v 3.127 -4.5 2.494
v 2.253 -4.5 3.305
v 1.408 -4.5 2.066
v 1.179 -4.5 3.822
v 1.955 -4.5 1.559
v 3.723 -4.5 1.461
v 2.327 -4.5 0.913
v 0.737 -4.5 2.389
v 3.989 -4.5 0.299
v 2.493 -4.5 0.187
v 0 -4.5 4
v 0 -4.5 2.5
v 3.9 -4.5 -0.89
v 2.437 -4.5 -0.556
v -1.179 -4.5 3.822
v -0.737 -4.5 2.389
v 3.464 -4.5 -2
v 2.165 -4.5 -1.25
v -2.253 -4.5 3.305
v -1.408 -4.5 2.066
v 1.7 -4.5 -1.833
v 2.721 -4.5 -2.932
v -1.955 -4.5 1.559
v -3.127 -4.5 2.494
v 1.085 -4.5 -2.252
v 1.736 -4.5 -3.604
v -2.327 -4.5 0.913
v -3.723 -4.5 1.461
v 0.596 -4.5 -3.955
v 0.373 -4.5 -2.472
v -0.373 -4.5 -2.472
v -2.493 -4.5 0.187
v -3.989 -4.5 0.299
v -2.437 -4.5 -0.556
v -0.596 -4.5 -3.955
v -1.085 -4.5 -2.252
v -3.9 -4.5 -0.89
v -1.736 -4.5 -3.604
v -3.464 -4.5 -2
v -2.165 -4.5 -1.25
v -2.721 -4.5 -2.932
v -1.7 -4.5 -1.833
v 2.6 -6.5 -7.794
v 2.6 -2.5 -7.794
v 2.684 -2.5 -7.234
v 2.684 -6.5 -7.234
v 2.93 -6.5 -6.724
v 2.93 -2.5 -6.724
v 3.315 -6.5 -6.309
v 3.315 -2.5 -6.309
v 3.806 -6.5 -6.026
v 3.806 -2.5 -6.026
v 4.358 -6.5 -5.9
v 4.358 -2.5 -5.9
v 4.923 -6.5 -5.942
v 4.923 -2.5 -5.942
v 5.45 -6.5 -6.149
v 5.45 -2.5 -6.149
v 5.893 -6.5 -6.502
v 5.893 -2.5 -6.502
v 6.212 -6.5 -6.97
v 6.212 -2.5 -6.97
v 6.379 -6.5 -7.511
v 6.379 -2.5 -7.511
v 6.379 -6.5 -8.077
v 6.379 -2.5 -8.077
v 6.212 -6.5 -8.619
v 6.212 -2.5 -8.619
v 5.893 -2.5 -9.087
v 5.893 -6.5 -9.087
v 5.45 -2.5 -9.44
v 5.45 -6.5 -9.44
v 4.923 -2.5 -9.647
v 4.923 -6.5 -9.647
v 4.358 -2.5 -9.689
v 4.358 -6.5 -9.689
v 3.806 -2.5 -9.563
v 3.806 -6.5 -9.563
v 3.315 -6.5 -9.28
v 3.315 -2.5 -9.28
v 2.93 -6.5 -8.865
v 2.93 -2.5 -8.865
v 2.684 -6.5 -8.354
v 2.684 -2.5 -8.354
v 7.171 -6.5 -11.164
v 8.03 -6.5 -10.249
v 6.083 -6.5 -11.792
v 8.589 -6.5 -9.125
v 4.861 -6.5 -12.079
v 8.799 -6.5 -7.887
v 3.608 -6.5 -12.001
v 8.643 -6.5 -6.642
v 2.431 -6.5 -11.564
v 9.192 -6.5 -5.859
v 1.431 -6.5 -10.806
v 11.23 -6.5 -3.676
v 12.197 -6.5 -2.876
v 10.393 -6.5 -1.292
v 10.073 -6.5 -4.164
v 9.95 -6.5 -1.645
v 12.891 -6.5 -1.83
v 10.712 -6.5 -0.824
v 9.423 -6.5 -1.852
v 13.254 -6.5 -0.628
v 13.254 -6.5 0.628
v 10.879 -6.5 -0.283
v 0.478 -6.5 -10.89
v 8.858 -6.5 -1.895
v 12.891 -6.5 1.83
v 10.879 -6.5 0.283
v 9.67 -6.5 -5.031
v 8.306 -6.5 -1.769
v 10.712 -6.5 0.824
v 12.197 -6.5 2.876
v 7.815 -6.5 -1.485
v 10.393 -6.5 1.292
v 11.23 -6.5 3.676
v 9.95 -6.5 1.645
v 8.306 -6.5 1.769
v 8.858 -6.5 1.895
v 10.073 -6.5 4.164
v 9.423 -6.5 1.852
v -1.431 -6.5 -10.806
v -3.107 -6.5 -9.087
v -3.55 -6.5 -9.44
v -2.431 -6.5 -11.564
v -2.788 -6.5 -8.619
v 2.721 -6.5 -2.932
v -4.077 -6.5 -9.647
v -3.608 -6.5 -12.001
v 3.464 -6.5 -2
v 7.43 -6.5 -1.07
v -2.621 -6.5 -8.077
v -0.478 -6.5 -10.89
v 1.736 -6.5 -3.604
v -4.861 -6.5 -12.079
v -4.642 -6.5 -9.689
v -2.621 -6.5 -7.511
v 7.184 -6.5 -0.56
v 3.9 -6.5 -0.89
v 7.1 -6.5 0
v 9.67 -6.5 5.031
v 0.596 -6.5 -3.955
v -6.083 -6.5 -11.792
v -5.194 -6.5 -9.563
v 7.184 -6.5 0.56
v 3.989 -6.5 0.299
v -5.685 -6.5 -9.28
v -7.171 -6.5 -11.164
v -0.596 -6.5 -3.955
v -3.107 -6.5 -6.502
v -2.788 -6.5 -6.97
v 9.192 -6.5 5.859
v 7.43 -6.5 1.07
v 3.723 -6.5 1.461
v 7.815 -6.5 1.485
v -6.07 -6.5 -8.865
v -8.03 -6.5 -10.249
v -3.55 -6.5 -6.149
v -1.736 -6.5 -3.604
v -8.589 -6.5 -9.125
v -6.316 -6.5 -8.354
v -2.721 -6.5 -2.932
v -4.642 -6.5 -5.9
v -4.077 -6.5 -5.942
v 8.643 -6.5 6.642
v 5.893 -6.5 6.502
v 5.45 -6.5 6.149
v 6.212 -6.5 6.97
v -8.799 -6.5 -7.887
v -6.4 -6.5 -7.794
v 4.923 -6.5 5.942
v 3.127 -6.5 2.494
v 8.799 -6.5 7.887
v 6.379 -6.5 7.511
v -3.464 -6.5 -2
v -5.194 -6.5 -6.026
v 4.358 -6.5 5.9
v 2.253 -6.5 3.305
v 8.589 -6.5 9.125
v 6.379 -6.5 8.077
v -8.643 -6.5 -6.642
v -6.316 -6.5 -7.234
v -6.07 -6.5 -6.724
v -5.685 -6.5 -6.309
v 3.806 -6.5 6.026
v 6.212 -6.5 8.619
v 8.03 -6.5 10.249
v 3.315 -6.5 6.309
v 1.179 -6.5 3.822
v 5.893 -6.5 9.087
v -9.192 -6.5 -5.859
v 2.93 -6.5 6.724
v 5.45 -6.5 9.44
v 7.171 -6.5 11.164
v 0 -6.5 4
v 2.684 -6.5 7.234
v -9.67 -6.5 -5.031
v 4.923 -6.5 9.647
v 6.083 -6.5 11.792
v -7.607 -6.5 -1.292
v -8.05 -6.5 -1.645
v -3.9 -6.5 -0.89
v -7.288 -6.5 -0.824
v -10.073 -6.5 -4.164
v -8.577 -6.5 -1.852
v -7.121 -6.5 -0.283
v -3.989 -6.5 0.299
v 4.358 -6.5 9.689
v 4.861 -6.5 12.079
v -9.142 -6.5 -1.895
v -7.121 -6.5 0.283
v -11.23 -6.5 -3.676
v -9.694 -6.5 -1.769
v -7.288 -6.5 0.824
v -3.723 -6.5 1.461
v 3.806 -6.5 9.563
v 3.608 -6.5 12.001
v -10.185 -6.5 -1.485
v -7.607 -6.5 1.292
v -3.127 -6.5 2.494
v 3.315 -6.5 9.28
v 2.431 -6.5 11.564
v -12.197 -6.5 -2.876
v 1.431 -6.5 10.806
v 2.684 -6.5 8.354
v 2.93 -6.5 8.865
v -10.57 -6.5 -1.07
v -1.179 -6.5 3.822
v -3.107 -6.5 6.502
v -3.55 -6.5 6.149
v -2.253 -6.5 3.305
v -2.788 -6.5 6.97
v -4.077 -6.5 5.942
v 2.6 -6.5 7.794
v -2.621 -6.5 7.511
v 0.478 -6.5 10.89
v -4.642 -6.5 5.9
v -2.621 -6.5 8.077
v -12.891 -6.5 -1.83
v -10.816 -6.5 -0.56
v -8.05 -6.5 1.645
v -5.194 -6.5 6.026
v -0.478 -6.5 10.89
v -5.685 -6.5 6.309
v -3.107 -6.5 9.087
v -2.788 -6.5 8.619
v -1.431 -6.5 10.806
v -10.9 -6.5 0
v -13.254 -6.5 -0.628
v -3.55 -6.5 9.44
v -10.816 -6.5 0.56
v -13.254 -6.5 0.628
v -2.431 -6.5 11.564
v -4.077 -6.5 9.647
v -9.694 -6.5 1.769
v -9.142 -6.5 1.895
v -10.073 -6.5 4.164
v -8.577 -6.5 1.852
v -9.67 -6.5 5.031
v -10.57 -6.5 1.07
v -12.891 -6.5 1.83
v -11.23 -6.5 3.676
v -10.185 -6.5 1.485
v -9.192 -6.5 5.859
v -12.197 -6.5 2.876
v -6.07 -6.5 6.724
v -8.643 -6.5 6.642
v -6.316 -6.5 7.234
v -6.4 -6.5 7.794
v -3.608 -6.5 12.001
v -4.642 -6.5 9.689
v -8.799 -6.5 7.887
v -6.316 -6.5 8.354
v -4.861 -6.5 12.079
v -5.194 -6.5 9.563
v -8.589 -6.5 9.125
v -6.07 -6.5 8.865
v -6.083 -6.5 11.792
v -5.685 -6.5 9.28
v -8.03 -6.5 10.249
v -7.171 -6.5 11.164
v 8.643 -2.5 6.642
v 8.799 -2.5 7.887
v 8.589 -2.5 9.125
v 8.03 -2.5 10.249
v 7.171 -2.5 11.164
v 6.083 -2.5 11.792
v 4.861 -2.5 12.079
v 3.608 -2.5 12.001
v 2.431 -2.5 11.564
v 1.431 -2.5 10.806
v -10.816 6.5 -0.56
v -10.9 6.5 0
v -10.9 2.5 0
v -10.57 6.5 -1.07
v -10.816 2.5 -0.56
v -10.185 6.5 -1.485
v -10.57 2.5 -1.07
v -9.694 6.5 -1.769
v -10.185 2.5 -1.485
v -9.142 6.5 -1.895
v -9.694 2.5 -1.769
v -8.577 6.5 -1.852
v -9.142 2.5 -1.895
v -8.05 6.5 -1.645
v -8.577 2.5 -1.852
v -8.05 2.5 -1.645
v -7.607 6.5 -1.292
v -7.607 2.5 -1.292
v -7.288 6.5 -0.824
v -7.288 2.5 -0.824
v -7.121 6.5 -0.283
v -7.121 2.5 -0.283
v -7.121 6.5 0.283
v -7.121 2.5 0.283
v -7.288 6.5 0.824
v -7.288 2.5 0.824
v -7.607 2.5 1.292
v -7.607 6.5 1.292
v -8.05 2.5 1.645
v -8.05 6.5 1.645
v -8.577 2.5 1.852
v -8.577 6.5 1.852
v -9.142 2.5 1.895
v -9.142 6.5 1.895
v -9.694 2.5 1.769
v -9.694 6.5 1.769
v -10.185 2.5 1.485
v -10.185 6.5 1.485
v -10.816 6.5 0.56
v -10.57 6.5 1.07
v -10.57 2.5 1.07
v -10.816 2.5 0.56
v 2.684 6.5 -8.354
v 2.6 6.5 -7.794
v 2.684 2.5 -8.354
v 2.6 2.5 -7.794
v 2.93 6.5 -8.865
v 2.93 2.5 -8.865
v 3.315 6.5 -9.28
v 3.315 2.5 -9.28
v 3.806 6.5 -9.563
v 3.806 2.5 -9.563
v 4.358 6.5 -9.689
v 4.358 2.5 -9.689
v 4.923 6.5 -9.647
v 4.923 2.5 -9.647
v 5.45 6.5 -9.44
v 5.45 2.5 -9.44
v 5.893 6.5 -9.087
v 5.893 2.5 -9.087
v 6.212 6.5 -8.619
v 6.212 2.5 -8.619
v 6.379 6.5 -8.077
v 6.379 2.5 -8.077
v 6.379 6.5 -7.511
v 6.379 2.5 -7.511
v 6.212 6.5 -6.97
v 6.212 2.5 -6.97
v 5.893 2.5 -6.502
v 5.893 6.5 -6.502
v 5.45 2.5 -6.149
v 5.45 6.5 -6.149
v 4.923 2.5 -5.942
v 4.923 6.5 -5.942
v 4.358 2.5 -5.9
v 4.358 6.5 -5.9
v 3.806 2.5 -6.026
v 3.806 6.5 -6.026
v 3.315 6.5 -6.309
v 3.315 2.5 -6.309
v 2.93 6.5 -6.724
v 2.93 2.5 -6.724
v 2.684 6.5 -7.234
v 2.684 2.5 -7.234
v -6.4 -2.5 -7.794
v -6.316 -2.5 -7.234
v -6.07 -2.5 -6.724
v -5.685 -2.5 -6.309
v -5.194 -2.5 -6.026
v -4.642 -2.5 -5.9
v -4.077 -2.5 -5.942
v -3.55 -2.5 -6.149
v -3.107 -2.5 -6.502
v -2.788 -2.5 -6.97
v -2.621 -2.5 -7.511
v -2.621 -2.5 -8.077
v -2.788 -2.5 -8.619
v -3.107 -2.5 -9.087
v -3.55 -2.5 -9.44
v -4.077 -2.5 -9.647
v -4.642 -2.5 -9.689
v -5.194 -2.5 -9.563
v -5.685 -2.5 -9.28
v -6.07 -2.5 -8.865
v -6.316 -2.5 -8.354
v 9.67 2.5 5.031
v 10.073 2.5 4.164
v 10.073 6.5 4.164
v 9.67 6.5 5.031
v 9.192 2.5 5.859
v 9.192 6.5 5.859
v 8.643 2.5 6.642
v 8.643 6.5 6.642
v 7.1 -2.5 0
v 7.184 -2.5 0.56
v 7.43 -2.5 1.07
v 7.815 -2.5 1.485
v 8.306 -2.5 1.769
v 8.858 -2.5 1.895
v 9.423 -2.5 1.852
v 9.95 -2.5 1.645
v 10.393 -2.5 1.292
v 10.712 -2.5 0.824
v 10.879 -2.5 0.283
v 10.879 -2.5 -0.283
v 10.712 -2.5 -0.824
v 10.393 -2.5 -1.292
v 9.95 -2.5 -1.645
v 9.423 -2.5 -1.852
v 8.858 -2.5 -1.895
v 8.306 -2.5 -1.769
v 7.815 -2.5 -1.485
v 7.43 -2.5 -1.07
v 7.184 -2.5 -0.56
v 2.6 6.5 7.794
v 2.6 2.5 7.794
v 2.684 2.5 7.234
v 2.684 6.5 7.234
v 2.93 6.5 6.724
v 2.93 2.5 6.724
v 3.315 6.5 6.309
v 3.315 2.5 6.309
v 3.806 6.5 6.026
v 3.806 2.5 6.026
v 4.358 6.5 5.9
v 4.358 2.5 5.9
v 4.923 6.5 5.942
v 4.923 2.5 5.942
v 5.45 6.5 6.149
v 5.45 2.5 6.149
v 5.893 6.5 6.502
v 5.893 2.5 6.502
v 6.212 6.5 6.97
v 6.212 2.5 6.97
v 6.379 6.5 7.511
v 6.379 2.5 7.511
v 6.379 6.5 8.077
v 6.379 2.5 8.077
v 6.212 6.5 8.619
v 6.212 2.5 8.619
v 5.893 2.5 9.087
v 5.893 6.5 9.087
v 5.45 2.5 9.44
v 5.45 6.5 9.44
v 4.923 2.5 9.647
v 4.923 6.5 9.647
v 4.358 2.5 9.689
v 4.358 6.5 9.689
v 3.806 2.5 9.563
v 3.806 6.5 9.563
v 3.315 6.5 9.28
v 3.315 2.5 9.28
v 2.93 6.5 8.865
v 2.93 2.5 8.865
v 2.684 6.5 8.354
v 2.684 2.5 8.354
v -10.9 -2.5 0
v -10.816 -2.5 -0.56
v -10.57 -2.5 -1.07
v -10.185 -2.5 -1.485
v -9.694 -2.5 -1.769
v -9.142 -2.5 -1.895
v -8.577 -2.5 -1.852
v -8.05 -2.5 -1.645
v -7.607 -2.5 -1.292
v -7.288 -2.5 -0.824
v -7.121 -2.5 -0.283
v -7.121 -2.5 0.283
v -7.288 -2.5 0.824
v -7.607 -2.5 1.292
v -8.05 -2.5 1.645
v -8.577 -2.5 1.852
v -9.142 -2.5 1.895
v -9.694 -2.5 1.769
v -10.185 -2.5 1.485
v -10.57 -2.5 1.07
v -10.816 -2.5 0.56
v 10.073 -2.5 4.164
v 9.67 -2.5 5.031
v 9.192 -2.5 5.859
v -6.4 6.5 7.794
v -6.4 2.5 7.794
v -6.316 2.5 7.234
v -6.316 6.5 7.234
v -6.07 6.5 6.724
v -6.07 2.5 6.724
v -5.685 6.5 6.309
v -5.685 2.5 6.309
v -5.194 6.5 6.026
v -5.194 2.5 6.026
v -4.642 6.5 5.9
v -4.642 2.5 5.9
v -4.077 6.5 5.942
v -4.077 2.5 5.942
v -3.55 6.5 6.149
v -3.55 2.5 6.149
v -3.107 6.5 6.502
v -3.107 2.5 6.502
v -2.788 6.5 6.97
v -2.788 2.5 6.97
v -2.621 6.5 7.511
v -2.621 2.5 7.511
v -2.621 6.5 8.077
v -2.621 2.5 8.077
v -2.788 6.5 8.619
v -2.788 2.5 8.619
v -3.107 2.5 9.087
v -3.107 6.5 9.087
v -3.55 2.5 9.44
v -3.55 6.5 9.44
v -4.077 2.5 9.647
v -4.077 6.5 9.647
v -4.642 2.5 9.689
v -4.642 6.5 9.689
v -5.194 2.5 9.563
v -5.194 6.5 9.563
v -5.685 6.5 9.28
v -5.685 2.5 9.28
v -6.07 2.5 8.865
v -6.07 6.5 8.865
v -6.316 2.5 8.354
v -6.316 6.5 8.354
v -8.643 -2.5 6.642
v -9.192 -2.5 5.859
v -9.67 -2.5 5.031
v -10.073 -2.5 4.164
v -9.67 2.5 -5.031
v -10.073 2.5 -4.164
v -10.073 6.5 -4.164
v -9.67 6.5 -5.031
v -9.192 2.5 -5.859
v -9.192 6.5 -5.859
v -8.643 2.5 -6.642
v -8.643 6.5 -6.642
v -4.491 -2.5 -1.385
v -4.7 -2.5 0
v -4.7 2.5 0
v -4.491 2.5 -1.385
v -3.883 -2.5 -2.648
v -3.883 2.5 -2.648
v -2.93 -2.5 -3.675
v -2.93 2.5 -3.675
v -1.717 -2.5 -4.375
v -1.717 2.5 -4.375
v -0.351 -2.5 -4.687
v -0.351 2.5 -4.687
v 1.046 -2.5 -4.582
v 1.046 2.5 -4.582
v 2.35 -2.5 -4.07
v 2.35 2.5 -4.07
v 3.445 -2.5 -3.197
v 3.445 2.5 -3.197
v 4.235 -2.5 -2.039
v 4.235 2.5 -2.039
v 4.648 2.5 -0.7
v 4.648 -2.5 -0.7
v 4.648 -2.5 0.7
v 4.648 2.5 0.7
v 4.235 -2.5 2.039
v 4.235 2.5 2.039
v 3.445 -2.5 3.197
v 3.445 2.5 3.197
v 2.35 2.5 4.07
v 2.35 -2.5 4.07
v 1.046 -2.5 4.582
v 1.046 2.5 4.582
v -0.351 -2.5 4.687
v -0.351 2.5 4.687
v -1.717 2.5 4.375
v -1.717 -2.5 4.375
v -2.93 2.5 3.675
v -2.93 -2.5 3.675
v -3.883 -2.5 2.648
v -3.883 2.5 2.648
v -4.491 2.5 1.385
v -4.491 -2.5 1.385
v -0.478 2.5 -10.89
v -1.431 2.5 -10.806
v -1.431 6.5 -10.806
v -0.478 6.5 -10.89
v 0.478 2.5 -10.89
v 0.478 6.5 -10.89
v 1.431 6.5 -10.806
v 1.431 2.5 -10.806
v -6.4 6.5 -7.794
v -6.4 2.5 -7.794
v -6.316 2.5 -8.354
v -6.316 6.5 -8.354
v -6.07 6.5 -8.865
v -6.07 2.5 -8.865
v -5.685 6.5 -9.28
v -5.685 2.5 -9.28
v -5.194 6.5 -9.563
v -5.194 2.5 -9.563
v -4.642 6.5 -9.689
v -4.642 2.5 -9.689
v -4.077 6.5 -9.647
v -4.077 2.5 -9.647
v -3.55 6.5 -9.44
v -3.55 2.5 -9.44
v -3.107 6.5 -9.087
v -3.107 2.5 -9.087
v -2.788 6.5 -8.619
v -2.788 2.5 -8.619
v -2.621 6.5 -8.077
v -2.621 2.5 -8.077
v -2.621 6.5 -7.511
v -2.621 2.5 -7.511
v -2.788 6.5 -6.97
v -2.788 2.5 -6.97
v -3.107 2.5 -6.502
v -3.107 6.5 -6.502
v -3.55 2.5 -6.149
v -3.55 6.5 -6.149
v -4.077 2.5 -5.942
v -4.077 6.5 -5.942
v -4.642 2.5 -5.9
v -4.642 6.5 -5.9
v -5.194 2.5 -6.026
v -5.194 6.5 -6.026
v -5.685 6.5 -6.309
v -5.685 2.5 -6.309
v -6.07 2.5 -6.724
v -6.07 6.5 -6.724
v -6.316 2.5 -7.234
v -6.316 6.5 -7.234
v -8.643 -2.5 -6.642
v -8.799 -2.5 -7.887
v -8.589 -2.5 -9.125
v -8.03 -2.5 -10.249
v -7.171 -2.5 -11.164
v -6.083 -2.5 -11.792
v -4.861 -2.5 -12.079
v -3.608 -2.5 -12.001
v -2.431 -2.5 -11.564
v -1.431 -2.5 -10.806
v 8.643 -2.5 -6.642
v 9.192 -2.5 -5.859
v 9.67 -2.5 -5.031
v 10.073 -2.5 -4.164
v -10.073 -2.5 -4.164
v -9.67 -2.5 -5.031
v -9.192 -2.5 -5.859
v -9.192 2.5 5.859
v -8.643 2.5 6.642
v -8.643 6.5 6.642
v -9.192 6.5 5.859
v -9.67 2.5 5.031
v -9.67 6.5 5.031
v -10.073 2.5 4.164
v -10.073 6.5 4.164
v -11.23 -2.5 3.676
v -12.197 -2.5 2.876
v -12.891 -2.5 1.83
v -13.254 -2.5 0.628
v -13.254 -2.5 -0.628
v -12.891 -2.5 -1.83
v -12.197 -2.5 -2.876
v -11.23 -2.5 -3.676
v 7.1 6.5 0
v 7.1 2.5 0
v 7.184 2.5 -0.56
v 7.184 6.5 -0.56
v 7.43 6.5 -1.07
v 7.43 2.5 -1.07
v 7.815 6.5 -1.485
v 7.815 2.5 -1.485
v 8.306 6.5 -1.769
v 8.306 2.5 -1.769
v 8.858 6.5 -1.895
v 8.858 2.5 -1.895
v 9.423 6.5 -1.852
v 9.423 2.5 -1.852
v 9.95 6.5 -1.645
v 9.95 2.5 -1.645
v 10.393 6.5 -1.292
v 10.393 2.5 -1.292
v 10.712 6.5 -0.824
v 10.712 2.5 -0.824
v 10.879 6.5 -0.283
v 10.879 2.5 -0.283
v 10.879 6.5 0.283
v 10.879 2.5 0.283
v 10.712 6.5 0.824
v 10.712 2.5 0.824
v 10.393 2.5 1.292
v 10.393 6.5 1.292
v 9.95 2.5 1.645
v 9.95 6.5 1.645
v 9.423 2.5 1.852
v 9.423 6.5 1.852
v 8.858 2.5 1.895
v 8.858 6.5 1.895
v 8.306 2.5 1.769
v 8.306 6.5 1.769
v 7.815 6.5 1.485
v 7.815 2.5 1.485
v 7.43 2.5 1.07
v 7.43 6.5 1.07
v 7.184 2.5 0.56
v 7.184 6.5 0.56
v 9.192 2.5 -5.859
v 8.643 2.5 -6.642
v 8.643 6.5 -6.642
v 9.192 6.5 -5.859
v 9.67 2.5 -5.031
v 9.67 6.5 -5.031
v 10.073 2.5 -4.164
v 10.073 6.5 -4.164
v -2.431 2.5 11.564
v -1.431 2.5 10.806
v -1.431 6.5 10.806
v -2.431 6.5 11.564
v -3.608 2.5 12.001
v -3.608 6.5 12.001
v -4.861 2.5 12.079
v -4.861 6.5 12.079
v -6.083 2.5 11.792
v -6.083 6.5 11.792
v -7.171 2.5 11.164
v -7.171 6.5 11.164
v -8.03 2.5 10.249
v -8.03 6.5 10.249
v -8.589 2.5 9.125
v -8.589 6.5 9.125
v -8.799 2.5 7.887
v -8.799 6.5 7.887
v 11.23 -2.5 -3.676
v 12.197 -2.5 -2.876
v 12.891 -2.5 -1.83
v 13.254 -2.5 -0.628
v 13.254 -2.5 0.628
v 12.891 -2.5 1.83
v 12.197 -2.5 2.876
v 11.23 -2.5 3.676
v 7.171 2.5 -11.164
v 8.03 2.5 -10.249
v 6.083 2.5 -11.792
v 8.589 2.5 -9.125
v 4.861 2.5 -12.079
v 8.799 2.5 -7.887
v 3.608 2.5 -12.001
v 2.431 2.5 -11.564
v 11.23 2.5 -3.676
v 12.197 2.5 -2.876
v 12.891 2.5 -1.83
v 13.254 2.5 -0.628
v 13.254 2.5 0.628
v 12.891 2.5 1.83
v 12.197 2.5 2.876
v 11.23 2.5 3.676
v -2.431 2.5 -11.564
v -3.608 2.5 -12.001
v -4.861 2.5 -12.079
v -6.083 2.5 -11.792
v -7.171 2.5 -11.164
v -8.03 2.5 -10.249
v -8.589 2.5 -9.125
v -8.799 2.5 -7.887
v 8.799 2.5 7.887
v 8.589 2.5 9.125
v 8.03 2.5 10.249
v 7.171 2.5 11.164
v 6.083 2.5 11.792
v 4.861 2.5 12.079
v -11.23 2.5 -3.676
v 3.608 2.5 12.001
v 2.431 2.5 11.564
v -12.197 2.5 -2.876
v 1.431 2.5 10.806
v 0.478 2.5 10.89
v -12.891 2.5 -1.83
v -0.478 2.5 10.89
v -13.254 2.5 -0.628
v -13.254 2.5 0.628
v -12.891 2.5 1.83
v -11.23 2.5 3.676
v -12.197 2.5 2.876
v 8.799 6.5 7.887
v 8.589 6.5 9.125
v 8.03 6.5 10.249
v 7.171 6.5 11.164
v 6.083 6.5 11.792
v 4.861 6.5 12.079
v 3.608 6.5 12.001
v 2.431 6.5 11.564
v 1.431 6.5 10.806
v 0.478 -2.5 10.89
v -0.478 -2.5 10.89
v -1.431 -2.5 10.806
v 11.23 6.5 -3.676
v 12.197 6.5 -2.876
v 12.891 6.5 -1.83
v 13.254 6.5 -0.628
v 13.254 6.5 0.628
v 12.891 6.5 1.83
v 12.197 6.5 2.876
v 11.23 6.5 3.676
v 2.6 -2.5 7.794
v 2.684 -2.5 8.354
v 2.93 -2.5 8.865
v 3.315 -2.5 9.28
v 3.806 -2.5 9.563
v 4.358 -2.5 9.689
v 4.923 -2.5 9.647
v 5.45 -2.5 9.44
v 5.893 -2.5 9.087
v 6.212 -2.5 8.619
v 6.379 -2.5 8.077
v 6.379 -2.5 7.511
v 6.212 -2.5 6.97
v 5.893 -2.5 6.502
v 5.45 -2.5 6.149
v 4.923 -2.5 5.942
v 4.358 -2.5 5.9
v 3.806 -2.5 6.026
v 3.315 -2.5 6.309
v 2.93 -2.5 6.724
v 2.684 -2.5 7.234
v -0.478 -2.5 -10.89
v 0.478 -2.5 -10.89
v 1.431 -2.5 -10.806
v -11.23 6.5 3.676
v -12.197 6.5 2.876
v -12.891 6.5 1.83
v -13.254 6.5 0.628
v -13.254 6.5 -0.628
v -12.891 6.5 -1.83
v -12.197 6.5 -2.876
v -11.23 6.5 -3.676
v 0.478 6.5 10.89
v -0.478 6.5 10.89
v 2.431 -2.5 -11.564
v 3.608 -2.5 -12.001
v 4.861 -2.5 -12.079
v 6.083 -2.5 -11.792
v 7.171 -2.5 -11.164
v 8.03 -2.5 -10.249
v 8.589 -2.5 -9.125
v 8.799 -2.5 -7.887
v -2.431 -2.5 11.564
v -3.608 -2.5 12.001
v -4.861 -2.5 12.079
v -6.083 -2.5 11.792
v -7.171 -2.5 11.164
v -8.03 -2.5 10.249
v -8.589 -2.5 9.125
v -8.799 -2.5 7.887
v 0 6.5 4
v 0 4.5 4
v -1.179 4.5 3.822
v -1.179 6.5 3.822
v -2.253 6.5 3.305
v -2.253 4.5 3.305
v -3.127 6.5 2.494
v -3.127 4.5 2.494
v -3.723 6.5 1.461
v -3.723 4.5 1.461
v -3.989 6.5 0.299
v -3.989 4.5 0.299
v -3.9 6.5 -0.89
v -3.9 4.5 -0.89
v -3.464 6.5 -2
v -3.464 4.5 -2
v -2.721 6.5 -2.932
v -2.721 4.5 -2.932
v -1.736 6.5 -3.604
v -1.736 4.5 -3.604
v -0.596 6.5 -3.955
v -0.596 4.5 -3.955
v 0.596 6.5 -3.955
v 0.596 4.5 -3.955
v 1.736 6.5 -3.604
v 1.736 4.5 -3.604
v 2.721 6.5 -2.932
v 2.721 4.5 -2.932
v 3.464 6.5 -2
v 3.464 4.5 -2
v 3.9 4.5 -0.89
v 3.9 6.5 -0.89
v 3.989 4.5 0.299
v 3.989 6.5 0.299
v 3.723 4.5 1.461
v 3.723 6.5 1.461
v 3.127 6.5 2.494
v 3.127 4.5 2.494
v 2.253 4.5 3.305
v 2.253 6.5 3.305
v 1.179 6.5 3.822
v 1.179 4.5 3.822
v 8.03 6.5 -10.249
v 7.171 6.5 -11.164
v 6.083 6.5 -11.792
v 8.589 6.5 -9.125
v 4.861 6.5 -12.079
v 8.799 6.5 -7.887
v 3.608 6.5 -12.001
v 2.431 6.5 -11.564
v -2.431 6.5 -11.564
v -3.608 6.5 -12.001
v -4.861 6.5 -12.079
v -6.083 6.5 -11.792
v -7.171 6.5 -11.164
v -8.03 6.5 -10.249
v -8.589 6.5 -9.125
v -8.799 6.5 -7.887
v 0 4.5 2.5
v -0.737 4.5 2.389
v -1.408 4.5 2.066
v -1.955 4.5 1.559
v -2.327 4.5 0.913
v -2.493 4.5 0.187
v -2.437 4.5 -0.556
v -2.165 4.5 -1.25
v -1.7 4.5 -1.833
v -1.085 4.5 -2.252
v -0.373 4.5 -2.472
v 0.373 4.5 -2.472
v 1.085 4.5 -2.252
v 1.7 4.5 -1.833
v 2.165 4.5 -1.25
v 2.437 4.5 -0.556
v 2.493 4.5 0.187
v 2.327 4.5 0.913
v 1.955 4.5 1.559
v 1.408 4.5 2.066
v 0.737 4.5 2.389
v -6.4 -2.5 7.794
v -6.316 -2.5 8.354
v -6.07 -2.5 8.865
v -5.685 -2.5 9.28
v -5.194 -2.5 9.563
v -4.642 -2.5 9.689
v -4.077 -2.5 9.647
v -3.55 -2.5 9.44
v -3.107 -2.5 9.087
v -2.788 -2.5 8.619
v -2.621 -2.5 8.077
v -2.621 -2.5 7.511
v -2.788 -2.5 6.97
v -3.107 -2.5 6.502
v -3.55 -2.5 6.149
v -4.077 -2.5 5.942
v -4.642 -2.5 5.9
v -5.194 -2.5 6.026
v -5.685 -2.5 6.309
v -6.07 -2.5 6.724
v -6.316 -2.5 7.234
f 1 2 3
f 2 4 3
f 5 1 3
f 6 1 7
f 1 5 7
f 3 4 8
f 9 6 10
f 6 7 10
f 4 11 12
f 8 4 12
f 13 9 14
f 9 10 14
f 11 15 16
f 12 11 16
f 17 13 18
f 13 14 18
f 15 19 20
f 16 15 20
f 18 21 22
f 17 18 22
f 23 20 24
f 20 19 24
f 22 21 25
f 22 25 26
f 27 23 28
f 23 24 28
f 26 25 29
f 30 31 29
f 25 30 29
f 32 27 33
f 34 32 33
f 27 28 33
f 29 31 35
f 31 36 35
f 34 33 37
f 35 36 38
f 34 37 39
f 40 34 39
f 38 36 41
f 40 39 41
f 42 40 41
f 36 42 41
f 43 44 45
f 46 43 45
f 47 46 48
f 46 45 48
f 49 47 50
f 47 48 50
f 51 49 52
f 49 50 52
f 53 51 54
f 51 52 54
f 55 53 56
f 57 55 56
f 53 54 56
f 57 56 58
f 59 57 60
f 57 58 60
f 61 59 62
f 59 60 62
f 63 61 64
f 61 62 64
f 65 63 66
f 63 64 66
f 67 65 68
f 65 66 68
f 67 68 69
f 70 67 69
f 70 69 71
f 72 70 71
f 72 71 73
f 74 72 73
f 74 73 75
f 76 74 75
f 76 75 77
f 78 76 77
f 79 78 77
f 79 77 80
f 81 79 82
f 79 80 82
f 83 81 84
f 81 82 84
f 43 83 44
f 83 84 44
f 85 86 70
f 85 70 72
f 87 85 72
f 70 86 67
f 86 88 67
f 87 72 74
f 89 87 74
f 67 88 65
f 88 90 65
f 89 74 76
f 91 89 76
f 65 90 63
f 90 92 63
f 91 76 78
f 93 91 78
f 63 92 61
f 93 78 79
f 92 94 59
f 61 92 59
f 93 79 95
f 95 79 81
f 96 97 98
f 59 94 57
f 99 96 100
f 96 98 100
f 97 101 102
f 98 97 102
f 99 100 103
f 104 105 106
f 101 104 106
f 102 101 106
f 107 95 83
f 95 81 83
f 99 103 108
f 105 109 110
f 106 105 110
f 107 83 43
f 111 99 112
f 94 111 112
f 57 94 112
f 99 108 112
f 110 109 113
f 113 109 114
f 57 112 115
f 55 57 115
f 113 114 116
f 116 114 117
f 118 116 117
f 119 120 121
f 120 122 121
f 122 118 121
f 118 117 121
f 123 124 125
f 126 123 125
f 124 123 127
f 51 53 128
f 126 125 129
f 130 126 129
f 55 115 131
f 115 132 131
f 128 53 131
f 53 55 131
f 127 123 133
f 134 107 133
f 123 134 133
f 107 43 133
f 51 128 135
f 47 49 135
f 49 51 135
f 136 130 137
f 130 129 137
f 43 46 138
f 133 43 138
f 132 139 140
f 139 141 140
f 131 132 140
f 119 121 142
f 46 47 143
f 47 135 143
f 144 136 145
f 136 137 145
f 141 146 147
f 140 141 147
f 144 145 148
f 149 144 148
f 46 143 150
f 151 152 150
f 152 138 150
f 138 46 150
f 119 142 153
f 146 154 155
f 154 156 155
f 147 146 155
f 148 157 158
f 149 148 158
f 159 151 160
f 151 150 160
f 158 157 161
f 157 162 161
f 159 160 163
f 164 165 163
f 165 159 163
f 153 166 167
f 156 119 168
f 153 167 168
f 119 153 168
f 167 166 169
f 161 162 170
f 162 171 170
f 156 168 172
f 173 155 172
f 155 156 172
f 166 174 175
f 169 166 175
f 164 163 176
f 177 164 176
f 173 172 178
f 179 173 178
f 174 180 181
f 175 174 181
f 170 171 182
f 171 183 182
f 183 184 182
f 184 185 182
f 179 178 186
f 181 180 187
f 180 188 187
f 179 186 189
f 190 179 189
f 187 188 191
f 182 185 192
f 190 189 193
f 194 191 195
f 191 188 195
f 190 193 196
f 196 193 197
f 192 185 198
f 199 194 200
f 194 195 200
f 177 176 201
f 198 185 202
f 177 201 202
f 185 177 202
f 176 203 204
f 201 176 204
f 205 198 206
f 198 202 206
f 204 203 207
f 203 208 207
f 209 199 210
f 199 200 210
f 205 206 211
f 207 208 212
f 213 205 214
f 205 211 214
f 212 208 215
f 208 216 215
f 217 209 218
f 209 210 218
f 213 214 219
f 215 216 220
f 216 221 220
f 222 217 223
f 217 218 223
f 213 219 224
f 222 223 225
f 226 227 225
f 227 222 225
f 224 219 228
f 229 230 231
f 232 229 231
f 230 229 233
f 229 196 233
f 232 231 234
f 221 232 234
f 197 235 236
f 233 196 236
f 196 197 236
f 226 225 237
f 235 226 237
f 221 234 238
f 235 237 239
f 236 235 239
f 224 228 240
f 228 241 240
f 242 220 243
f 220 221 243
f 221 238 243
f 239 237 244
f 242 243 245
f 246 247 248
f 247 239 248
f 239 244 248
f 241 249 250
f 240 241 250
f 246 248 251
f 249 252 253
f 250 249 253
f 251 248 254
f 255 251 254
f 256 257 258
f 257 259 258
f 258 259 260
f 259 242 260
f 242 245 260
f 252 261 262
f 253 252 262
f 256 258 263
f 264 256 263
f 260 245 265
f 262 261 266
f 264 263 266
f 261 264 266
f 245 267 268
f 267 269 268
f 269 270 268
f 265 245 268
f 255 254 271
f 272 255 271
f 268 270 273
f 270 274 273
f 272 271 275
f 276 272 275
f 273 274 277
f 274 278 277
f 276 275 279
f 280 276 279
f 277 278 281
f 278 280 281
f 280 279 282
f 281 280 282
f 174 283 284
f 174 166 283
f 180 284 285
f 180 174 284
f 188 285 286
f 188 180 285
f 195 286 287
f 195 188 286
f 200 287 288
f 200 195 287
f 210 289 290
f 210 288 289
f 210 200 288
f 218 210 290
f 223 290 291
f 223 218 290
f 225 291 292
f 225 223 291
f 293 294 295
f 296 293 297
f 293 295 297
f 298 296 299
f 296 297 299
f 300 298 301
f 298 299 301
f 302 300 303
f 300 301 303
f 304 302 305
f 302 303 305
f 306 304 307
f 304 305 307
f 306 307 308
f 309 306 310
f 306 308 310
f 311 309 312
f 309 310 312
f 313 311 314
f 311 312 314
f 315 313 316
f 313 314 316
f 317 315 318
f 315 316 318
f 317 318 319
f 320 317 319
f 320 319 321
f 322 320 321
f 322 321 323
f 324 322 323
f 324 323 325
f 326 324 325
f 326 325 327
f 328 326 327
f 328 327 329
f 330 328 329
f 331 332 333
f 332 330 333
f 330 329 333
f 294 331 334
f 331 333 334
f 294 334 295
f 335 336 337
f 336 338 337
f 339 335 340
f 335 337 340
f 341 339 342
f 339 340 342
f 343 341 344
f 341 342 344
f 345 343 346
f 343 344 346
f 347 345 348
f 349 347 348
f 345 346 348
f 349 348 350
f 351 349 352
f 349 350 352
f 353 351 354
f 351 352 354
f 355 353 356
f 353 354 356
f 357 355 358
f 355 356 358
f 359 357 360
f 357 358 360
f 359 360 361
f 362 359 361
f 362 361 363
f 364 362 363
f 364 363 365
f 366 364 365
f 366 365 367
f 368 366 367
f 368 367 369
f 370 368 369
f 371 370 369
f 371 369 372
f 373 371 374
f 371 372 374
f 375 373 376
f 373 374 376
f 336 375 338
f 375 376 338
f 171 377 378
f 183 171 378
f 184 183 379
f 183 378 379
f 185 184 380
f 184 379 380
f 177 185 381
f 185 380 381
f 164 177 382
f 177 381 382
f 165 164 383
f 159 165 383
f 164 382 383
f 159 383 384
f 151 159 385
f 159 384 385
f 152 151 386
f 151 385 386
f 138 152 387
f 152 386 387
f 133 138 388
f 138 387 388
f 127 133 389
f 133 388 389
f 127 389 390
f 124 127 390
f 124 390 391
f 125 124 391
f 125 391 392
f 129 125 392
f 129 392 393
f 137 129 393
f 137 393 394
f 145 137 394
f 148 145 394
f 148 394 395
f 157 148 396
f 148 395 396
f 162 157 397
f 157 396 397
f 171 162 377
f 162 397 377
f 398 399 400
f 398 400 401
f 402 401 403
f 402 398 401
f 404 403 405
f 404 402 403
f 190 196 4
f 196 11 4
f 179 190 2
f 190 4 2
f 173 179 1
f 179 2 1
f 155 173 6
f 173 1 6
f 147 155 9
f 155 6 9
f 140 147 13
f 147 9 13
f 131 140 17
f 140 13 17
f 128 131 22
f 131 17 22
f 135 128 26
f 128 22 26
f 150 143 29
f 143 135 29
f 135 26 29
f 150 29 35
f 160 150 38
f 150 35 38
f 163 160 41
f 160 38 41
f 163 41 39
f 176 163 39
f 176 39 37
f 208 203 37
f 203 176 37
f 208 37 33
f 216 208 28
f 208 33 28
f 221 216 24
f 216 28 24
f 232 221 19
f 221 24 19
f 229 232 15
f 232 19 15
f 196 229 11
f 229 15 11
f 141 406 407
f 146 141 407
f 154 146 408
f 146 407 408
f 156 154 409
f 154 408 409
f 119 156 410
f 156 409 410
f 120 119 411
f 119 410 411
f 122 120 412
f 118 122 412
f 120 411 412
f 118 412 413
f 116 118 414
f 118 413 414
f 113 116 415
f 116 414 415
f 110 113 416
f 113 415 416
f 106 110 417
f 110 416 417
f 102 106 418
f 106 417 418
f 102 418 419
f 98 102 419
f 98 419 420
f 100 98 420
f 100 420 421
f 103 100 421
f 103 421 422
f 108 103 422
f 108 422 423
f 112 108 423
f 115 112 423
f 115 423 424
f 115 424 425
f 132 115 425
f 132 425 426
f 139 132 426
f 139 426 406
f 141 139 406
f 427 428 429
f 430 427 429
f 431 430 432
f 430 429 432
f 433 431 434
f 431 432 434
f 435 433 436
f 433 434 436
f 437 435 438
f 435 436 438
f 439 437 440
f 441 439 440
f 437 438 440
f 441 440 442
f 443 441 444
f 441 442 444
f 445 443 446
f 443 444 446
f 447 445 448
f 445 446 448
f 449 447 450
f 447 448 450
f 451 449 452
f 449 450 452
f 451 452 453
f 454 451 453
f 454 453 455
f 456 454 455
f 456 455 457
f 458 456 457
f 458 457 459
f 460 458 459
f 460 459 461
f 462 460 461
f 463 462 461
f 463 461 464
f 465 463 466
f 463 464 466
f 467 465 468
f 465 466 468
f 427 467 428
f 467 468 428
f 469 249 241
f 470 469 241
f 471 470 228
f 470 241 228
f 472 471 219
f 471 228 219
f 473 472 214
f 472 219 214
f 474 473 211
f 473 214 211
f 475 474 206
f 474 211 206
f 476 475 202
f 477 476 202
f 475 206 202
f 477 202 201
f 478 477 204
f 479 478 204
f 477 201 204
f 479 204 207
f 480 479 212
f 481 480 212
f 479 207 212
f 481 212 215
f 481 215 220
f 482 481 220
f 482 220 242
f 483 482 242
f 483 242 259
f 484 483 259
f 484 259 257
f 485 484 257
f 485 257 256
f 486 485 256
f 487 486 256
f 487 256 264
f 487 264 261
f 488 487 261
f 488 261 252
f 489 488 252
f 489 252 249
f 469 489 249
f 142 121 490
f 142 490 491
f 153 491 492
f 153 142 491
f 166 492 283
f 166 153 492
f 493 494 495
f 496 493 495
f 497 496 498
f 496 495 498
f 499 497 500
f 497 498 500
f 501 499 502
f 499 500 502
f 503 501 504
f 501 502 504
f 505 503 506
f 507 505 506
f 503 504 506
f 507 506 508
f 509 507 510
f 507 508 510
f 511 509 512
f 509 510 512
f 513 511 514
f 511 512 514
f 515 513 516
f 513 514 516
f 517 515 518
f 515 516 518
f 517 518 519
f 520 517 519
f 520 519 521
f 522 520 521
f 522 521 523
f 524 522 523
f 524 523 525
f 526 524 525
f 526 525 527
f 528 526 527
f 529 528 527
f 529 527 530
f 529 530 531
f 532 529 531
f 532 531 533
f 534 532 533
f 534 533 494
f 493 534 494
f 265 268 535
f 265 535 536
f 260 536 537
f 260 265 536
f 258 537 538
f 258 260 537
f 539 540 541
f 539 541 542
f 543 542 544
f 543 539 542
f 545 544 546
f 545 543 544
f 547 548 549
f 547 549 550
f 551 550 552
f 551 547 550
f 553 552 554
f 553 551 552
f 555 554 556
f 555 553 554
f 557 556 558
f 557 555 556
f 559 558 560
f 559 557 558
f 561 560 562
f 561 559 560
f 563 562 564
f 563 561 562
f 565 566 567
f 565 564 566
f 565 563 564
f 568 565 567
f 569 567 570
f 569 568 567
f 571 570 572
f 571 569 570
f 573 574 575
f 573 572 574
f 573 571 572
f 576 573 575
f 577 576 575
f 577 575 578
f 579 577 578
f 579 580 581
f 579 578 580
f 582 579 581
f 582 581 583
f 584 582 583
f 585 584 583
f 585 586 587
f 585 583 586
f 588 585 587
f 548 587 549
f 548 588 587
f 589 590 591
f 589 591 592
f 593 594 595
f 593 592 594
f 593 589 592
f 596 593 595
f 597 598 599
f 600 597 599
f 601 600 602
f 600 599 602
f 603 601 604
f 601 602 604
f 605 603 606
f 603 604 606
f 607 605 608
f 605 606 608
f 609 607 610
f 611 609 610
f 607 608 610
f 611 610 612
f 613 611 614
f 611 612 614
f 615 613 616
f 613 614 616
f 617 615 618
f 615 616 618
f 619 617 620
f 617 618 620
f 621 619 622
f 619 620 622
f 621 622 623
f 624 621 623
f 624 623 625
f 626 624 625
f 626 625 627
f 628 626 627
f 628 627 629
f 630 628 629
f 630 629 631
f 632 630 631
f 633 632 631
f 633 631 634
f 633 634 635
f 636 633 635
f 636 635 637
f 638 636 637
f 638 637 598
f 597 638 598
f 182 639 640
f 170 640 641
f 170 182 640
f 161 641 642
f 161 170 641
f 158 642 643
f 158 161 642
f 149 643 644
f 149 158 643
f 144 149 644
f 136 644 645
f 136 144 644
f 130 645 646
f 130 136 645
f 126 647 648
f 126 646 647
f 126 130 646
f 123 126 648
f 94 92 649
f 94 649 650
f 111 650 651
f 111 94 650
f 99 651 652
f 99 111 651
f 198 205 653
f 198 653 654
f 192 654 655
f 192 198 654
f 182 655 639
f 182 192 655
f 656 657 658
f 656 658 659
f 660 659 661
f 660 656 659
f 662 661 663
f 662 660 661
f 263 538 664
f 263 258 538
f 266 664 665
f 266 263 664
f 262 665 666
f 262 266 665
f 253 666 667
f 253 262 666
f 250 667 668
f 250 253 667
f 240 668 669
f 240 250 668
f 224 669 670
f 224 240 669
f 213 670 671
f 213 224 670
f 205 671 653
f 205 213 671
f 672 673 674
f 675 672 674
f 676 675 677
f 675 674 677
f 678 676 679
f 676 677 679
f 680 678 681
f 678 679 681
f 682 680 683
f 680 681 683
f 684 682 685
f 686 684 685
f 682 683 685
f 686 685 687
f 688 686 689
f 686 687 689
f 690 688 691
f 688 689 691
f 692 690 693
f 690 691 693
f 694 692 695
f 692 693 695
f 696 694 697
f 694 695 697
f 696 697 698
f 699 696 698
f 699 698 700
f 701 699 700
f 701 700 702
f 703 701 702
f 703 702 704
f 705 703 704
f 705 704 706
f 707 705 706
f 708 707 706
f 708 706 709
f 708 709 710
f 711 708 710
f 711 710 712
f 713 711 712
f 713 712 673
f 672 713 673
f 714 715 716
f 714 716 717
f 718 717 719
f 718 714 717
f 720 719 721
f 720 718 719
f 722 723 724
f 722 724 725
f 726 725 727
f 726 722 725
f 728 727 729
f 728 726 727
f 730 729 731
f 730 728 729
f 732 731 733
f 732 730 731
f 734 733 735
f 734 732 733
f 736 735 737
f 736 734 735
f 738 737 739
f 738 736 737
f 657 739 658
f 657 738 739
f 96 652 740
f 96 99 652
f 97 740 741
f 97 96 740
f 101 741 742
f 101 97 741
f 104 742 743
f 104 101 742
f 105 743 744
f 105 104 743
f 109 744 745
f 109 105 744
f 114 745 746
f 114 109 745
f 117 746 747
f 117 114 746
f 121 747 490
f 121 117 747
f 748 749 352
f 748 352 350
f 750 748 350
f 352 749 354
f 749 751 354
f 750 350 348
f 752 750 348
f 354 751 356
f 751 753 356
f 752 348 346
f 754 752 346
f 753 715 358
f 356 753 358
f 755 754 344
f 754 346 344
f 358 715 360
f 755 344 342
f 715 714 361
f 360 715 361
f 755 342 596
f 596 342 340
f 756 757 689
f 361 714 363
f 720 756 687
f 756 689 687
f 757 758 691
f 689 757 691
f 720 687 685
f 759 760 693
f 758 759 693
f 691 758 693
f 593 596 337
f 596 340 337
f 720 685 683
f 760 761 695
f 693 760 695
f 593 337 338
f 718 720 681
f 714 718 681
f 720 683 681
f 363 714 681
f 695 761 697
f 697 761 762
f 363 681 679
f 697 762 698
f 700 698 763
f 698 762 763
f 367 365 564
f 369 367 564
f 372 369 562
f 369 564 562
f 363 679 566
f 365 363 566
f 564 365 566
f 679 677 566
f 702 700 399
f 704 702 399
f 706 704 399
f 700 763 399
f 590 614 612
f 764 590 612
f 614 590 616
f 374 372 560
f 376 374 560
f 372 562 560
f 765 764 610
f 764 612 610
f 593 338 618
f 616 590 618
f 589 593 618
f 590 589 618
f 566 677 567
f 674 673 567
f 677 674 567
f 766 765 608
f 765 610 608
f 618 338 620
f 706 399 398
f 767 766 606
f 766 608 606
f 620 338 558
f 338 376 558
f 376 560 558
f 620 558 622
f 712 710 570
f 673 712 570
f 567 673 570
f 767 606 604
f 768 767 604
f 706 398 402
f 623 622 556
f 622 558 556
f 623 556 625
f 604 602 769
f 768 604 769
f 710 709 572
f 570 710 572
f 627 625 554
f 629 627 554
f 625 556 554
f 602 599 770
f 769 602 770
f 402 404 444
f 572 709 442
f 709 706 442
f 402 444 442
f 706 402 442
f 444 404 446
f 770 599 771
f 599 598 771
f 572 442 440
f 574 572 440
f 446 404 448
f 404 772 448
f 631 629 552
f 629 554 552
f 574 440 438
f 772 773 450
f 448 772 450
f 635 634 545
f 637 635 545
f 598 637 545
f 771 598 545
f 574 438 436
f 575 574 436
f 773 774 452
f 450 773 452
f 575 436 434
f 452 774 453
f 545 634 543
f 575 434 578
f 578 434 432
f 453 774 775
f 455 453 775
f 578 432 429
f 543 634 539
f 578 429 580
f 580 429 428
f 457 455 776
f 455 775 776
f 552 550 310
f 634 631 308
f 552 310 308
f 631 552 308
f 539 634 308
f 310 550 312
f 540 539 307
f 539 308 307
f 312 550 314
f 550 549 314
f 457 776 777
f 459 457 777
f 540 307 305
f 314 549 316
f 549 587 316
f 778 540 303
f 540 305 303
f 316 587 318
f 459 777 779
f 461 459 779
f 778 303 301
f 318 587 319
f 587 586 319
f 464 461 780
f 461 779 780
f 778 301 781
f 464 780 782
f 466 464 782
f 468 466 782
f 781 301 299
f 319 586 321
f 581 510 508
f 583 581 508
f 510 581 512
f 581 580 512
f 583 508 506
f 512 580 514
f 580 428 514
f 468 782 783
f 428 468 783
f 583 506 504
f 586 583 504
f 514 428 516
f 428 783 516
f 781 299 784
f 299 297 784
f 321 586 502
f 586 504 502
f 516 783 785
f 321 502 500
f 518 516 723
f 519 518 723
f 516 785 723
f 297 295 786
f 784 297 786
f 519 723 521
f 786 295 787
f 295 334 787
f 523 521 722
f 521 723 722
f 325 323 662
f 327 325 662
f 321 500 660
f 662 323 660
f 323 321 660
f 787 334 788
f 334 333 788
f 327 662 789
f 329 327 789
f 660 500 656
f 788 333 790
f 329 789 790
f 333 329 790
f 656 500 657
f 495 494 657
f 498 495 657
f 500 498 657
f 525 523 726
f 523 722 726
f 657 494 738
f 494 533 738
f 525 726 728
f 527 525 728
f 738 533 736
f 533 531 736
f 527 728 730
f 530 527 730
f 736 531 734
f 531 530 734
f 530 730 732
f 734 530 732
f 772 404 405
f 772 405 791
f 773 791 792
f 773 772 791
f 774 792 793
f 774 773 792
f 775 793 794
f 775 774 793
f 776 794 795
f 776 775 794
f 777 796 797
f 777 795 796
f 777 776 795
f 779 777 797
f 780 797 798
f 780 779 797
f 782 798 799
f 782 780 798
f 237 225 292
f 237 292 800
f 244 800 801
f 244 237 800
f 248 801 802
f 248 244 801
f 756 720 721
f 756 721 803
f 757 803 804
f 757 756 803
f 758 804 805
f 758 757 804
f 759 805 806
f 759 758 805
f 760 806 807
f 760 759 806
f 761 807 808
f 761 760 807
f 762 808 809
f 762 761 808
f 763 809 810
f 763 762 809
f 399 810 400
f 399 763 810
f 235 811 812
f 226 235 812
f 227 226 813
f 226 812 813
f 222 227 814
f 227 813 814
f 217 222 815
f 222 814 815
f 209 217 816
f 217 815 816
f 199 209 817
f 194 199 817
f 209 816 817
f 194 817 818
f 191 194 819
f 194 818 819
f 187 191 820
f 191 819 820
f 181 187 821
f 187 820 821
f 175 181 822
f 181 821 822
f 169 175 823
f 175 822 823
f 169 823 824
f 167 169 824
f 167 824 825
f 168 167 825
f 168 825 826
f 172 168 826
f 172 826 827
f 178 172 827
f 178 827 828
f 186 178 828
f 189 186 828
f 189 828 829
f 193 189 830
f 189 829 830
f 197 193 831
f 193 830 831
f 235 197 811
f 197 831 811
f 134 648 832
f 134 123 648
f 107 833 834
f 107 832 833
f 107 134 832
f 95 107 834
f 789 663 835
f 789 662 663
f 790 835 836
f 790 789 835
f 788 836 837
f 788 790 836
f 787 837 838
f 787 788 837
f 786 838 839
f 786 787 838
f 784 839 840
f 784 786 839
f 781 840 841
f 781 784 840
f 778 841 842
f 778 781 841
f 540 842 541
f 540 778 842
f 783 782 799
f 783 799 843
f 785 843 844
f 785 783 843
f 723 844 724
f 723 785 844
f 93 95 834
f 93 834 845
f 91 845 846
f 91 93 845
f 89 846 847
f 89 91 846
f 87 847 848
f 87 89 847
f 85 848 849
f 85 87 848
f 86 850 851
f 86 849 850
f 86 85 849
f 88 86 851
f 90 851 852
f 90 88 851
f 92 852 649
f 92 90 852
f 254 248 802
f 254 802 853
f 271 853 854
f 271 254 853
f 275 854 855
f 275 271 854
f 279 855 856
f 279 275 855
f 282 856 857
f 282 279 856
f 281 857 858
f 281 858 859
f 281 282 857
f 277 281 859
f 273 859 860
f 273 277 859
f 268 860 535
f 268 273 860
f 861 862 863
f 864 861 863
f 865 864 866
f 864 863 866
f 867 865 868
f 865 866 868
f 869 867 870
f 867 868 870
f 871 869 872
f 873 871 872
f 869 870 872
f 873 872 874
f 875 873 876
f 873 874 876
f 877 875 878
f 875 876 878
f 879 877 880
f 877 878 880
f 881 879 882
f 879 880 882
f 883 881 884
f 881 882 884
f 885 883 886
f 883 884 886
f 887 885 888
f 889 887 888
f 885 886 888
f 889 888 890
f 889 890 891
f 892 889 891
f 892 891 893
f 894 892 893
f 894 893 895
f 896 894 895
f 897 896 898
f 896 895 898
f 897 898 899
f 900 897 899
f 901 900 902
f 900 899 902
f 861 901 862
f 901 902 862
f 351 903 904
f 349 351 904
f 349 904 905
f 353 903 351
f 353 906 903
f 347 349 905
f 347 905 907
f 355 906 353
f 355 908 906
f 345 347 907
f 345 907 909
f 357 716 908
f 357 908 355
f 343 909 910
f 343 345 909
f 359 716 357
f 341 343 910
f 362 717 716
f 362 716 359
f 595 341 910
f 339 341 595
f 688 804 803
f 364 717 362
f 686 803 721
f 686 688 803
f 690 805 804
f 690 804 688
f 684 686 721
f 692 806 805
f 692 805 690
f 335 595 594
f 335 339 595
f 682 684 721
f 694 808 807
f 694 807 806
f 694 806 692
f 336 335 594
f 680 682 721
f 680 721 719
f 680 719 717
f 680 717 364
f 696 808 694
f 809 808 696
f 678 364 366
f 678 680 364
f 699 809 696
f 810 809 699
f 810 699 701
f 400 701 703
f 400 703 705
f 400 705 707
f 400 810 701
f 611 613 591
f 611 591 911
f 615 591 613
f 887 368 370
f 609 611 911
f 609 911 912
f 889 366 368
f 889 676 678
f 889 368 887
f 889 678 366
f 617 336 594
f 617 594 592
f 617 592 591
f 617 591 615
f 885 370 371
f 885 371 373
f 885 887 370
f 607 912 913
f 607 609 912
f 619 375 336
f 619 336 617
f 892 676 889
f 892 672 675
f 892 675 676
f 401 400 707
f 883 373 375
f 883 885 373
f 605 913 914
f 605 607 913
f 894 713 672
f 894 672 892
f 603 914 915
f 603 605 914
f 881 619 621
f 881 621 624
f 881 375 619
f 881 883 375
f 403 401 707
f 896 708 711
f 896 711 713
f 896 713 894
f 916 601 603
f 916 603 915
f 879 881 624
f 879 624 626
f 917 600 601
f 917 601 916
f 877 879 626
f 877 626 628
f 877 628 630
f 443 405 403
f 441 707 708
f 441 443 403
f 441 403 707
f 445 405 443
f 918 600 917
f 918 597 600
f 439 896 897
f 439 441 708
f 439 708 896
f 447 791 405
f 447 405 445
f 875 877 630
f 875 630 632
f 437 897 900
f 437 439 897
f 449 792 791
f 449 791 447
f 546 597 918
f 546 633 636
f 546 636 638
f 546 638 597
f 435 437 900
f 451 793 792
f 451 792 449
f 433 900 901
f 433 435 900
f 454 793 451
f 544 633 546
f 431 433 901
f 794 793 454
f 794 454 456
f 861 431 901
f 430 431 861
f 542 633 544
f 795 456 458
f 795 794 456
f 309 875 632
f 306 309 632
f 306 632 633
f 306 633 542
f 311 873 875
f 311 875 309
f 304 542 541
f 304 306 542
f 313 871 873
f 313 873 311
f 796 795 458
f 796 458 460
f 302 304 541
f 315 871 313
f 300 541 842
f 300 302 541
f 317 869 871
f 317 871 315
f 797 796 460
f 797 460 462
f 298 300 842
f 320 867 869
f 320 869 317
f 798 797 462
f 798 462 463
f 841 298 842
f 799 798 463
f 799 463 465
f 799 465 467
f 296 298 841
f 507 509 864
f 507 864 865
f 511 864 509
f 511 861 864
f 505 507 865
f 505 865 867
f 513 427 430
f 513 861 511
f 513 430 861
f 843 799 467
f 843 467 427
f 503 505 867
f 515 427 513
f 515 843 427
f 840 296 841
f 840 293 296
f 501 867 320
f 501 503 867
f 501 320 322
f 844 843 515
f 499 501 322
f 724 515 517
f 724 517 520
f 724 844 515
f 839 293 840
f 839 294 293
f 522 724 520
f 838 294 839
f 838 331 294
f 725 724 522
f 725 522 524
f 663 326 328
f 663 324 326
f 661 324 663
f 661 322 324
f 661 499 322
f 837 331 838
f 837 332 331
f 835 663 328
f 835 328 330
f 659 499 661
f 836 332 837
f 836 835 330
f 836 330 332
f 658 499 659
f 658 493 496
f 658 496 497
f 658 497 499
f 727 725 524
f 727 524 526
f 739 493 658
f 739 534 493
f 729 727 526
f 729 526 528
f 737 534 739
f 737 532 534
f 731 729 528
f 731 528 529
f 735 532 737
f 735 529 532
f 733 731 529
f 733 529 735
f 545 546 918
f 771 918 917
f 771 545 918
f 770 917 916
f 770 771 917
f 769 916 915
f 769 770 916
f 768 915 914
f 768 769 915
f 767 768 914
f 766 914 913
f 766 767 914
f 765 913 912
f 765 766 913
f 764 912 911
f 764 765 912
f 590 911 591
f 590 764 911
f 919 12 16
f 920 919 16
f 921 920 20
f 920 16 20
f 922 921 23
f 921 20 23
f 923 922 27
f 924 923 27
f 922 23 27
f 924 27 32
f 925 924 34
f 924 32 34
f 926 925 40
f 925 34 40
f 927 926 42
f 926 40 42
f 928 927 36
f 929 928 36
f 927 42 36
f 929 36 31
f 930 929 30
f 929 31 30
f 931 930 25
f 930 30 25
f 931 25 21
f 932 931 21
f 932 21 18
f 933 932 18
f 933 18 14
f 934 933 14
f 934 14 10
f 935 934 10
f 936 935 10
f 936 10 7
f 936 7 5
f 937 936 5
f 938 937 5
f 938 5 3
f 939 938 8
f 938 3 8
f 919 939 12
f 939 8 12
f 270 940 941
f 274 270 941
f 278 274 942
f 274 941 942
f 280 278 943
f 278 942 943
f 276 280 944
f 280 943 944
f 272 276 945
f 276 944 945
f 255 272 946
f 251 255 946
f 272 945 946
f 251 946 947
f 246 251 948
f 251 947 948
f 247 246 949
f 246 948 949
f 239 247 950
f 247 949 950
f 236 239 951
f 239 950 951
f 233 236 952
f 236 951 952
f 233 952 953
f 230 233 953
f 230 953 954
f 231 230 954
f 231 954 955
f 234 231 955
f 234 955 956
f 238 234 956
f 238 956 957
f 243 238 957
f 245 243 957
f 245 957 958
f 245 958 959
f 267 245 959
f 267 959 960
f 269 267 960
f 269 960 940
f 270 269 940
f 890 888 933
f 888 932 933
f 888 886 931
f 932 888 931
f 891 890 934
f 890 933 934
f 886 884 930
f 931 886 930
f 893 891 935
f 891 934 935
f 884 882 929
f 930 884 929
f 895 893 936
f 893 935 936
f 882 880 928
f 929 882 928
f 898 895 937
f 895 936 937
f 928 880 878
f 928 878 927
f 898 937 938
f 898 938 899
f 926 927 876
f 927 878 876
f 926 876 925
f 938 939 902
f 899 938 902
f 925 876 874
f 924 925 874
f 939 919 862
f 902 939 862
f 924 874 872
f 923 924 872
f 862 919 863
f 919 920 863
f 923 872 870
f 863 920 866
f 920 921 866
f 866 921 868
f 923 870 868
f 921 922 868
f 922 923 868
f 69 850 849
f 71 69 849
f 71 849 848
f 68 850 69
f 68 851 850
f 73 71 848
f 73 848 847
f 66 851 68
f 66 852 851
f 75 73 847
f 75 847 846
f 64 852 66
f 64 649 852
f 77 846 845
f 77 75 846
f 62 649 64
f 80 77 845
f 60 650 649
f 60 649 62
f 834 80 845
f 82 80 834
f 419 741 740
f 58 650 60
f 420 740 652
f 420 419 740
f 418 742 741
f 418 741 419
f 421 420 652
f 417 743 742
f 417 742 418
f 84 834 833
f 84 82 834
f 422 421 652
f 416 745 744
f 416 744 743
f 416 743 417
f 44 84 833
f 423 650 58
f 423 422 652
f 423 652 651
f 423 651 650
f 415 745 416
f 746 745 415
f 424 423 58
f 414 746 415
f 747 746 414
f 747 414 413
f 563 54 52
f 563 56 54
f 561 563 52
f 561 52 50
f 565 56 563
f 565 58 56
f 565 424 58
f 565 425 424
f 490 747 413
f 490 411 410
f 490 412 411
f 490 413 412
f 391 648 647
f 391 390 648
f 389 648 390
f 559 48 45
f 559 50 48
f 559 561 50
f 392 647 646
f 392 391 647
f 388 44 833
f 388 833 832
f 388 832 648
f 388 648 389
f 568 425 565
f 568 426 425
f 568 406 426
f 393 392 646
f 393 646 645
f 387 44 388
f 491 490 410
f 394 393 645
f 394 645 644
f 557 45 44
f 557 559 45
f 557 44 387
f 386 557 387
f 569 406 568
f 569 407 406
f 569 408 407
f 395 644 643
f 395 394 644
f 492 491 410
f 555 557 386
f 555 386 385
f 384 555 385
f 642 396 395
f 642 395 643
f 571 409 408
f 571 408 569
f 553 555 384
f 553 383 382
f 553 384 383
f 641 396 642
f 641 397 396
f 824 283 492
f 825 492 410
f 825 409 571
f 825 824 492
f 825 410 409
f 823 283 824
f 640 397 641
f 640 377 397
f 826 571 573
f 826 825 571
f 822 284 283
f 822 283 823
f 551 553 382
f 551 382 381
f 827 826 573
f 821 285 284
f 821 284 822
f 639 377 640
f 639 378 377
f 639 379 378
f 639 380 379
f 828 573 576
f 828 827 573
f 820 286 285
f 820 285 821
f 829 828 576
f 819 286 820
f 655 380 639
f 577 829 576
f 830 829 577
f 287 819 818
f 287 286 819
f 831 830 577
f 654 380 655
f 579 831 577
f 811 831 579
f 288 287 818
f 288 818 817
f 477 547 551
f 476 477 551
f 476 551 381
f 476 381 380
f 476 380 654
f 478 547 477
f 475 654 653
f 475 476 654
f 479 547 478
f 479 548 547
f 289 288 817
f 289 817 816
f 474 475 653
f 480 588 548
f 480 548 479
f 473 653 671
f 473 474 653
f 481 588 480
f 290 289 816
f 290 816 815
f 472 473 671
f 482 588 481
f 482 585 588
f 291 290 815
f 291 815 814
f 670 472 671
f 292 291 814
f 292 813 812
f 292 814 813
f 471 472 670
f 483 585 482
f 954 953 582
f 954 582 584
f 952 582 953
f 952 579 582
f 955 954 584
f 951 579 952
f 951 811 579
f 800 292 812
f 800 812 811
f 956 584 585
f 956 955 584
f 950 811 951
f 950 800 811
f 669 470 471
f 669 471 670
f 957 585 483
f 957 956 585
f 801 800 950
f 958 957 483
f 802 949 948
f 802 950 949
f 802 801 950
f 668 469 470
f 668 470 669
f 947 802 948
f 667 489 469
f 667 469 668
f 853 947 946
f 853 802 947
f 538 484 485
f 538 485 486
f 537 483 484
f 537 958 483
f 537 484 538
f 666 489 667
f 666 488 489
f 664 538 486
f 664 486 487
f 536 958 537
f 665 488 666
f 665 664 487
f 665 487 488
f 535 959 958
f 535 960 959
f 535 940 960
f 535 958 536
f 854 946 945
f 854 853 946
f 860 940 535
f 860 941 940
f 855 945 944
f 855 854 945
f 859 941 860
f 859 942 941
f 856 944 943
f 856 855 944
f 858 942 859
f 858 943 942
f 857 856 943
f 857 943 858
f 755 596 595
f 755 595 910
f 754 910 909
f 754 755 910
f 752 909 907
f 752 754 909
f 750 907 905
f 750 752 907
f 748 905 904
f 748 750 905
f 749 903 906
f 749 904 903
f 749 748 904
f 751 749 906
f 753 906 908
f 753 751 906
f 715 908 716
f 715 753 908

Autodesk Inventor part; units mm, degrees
ref_plane "YZ Plane" through (0, 0, 0) normal (1, 0, 0) x (0, 1, 0)
ref_plane "XZ Plane" through (0, 0, 0) normal (0, 1, 0) x (-1, 0, 0)
ref_plane "XY Plane" through (0, 0, 0) normal (0, 0, 1) x (1, 0, 0)
sketch "Sketch1" plane through (0, 0, 0) normal (0, 1, 0) x (-1, 0, 0)
  circle A0 centre (9, 0) radius 1.9
  circle A1 centre (4.5, 7.7942) radius 1.9
  circle A2 centre (-4.5, 7.7942) radius 1.9
  circle A3 centre (-9, 0) radius 1.9
  circle A4 centre (-4.5, -7.7942) radius 1.9
  circle A5 centre (4.5, -7.7942) radius 1.9
  circle A6 centre (9, 0) radius 4.3
  circle A7 centre (4.5, 7.7942) radius 4.3
  circle A8 centre (-4.5, 7.7942) radius 4.3
  circle A9 centre (-9, 0) radius 4.3
  circle A10 centre (-4.5, -7.7942) radius 4.3
  circle A11 centre (4.5, -7.7942) radius 4.3
  circle A12 centre (0, 0) radius 10.9
  circle A13 centre (0, 0) radius 2.25
  circle A14 centre (0, 0) radius 4.7
  dimension "d0" = 3.8
  dimension "d1" = 9
  dimension "d4" = 360
  dimension "d6" = 2.4
  dimension "d9" = 360
  dimension "d13" = 4.5
  dimension "d30" = 8.6
extrude "Extrusion1" add sketch "Sketch1" along normal mid plane 13 contours A12 A6 | A12 A6 | A6 A14 A7 A12 | A12 A11 A14 A6 | A14 | A12 A7 | A7 A12 | A12 A11 | A11 A12 | A14 A8 A12 A7 | A11 A12 A10 A14 | A14 A9 A12 A8 | A8 A12 | A10 A12 | A10 A12 A9 A14 | A12 A8 | A9 A12 | A10 A12 | A12 A9 | A13
extrude "Extrusion2" cut sketch "Sketch1" along normal through all both and the other way through all contours A13
extrude "Extrusion3" cut sketch "Sketch1" along normal mid plane 5 contours A0 | A12 A6 | A12 A6 | A6 A14 A7 A12 | A12 A11 A14 A6 | A14 | A12 A7 | A1 | A7 A12 | A5 | A12 A11 | A11 A12 | A14 A8 A12 A7 | A11 A12 A10 A14 | A14 A9 A12 A8 | A2 | A8 A12 | A4 | A10 A12 | A10 A12 A9 A14 | A12 A8 | A3 | A9 A12 | A10 A12 | A12 A9
extrude "Extrusion4" add sketch "Sketch1" along normal through all both and the other way through all contours A14
hole "Hole1" at (0, 6.5, 0) direction (0, -1, 0) diameter 5 end through all counterbore diameter 8 counterbore depth 2
mirror "Mirror1" about plane through (0, 0, 0) normal (0, 1, 0) of "Hole1"
properties part number "piston-star-connector"
